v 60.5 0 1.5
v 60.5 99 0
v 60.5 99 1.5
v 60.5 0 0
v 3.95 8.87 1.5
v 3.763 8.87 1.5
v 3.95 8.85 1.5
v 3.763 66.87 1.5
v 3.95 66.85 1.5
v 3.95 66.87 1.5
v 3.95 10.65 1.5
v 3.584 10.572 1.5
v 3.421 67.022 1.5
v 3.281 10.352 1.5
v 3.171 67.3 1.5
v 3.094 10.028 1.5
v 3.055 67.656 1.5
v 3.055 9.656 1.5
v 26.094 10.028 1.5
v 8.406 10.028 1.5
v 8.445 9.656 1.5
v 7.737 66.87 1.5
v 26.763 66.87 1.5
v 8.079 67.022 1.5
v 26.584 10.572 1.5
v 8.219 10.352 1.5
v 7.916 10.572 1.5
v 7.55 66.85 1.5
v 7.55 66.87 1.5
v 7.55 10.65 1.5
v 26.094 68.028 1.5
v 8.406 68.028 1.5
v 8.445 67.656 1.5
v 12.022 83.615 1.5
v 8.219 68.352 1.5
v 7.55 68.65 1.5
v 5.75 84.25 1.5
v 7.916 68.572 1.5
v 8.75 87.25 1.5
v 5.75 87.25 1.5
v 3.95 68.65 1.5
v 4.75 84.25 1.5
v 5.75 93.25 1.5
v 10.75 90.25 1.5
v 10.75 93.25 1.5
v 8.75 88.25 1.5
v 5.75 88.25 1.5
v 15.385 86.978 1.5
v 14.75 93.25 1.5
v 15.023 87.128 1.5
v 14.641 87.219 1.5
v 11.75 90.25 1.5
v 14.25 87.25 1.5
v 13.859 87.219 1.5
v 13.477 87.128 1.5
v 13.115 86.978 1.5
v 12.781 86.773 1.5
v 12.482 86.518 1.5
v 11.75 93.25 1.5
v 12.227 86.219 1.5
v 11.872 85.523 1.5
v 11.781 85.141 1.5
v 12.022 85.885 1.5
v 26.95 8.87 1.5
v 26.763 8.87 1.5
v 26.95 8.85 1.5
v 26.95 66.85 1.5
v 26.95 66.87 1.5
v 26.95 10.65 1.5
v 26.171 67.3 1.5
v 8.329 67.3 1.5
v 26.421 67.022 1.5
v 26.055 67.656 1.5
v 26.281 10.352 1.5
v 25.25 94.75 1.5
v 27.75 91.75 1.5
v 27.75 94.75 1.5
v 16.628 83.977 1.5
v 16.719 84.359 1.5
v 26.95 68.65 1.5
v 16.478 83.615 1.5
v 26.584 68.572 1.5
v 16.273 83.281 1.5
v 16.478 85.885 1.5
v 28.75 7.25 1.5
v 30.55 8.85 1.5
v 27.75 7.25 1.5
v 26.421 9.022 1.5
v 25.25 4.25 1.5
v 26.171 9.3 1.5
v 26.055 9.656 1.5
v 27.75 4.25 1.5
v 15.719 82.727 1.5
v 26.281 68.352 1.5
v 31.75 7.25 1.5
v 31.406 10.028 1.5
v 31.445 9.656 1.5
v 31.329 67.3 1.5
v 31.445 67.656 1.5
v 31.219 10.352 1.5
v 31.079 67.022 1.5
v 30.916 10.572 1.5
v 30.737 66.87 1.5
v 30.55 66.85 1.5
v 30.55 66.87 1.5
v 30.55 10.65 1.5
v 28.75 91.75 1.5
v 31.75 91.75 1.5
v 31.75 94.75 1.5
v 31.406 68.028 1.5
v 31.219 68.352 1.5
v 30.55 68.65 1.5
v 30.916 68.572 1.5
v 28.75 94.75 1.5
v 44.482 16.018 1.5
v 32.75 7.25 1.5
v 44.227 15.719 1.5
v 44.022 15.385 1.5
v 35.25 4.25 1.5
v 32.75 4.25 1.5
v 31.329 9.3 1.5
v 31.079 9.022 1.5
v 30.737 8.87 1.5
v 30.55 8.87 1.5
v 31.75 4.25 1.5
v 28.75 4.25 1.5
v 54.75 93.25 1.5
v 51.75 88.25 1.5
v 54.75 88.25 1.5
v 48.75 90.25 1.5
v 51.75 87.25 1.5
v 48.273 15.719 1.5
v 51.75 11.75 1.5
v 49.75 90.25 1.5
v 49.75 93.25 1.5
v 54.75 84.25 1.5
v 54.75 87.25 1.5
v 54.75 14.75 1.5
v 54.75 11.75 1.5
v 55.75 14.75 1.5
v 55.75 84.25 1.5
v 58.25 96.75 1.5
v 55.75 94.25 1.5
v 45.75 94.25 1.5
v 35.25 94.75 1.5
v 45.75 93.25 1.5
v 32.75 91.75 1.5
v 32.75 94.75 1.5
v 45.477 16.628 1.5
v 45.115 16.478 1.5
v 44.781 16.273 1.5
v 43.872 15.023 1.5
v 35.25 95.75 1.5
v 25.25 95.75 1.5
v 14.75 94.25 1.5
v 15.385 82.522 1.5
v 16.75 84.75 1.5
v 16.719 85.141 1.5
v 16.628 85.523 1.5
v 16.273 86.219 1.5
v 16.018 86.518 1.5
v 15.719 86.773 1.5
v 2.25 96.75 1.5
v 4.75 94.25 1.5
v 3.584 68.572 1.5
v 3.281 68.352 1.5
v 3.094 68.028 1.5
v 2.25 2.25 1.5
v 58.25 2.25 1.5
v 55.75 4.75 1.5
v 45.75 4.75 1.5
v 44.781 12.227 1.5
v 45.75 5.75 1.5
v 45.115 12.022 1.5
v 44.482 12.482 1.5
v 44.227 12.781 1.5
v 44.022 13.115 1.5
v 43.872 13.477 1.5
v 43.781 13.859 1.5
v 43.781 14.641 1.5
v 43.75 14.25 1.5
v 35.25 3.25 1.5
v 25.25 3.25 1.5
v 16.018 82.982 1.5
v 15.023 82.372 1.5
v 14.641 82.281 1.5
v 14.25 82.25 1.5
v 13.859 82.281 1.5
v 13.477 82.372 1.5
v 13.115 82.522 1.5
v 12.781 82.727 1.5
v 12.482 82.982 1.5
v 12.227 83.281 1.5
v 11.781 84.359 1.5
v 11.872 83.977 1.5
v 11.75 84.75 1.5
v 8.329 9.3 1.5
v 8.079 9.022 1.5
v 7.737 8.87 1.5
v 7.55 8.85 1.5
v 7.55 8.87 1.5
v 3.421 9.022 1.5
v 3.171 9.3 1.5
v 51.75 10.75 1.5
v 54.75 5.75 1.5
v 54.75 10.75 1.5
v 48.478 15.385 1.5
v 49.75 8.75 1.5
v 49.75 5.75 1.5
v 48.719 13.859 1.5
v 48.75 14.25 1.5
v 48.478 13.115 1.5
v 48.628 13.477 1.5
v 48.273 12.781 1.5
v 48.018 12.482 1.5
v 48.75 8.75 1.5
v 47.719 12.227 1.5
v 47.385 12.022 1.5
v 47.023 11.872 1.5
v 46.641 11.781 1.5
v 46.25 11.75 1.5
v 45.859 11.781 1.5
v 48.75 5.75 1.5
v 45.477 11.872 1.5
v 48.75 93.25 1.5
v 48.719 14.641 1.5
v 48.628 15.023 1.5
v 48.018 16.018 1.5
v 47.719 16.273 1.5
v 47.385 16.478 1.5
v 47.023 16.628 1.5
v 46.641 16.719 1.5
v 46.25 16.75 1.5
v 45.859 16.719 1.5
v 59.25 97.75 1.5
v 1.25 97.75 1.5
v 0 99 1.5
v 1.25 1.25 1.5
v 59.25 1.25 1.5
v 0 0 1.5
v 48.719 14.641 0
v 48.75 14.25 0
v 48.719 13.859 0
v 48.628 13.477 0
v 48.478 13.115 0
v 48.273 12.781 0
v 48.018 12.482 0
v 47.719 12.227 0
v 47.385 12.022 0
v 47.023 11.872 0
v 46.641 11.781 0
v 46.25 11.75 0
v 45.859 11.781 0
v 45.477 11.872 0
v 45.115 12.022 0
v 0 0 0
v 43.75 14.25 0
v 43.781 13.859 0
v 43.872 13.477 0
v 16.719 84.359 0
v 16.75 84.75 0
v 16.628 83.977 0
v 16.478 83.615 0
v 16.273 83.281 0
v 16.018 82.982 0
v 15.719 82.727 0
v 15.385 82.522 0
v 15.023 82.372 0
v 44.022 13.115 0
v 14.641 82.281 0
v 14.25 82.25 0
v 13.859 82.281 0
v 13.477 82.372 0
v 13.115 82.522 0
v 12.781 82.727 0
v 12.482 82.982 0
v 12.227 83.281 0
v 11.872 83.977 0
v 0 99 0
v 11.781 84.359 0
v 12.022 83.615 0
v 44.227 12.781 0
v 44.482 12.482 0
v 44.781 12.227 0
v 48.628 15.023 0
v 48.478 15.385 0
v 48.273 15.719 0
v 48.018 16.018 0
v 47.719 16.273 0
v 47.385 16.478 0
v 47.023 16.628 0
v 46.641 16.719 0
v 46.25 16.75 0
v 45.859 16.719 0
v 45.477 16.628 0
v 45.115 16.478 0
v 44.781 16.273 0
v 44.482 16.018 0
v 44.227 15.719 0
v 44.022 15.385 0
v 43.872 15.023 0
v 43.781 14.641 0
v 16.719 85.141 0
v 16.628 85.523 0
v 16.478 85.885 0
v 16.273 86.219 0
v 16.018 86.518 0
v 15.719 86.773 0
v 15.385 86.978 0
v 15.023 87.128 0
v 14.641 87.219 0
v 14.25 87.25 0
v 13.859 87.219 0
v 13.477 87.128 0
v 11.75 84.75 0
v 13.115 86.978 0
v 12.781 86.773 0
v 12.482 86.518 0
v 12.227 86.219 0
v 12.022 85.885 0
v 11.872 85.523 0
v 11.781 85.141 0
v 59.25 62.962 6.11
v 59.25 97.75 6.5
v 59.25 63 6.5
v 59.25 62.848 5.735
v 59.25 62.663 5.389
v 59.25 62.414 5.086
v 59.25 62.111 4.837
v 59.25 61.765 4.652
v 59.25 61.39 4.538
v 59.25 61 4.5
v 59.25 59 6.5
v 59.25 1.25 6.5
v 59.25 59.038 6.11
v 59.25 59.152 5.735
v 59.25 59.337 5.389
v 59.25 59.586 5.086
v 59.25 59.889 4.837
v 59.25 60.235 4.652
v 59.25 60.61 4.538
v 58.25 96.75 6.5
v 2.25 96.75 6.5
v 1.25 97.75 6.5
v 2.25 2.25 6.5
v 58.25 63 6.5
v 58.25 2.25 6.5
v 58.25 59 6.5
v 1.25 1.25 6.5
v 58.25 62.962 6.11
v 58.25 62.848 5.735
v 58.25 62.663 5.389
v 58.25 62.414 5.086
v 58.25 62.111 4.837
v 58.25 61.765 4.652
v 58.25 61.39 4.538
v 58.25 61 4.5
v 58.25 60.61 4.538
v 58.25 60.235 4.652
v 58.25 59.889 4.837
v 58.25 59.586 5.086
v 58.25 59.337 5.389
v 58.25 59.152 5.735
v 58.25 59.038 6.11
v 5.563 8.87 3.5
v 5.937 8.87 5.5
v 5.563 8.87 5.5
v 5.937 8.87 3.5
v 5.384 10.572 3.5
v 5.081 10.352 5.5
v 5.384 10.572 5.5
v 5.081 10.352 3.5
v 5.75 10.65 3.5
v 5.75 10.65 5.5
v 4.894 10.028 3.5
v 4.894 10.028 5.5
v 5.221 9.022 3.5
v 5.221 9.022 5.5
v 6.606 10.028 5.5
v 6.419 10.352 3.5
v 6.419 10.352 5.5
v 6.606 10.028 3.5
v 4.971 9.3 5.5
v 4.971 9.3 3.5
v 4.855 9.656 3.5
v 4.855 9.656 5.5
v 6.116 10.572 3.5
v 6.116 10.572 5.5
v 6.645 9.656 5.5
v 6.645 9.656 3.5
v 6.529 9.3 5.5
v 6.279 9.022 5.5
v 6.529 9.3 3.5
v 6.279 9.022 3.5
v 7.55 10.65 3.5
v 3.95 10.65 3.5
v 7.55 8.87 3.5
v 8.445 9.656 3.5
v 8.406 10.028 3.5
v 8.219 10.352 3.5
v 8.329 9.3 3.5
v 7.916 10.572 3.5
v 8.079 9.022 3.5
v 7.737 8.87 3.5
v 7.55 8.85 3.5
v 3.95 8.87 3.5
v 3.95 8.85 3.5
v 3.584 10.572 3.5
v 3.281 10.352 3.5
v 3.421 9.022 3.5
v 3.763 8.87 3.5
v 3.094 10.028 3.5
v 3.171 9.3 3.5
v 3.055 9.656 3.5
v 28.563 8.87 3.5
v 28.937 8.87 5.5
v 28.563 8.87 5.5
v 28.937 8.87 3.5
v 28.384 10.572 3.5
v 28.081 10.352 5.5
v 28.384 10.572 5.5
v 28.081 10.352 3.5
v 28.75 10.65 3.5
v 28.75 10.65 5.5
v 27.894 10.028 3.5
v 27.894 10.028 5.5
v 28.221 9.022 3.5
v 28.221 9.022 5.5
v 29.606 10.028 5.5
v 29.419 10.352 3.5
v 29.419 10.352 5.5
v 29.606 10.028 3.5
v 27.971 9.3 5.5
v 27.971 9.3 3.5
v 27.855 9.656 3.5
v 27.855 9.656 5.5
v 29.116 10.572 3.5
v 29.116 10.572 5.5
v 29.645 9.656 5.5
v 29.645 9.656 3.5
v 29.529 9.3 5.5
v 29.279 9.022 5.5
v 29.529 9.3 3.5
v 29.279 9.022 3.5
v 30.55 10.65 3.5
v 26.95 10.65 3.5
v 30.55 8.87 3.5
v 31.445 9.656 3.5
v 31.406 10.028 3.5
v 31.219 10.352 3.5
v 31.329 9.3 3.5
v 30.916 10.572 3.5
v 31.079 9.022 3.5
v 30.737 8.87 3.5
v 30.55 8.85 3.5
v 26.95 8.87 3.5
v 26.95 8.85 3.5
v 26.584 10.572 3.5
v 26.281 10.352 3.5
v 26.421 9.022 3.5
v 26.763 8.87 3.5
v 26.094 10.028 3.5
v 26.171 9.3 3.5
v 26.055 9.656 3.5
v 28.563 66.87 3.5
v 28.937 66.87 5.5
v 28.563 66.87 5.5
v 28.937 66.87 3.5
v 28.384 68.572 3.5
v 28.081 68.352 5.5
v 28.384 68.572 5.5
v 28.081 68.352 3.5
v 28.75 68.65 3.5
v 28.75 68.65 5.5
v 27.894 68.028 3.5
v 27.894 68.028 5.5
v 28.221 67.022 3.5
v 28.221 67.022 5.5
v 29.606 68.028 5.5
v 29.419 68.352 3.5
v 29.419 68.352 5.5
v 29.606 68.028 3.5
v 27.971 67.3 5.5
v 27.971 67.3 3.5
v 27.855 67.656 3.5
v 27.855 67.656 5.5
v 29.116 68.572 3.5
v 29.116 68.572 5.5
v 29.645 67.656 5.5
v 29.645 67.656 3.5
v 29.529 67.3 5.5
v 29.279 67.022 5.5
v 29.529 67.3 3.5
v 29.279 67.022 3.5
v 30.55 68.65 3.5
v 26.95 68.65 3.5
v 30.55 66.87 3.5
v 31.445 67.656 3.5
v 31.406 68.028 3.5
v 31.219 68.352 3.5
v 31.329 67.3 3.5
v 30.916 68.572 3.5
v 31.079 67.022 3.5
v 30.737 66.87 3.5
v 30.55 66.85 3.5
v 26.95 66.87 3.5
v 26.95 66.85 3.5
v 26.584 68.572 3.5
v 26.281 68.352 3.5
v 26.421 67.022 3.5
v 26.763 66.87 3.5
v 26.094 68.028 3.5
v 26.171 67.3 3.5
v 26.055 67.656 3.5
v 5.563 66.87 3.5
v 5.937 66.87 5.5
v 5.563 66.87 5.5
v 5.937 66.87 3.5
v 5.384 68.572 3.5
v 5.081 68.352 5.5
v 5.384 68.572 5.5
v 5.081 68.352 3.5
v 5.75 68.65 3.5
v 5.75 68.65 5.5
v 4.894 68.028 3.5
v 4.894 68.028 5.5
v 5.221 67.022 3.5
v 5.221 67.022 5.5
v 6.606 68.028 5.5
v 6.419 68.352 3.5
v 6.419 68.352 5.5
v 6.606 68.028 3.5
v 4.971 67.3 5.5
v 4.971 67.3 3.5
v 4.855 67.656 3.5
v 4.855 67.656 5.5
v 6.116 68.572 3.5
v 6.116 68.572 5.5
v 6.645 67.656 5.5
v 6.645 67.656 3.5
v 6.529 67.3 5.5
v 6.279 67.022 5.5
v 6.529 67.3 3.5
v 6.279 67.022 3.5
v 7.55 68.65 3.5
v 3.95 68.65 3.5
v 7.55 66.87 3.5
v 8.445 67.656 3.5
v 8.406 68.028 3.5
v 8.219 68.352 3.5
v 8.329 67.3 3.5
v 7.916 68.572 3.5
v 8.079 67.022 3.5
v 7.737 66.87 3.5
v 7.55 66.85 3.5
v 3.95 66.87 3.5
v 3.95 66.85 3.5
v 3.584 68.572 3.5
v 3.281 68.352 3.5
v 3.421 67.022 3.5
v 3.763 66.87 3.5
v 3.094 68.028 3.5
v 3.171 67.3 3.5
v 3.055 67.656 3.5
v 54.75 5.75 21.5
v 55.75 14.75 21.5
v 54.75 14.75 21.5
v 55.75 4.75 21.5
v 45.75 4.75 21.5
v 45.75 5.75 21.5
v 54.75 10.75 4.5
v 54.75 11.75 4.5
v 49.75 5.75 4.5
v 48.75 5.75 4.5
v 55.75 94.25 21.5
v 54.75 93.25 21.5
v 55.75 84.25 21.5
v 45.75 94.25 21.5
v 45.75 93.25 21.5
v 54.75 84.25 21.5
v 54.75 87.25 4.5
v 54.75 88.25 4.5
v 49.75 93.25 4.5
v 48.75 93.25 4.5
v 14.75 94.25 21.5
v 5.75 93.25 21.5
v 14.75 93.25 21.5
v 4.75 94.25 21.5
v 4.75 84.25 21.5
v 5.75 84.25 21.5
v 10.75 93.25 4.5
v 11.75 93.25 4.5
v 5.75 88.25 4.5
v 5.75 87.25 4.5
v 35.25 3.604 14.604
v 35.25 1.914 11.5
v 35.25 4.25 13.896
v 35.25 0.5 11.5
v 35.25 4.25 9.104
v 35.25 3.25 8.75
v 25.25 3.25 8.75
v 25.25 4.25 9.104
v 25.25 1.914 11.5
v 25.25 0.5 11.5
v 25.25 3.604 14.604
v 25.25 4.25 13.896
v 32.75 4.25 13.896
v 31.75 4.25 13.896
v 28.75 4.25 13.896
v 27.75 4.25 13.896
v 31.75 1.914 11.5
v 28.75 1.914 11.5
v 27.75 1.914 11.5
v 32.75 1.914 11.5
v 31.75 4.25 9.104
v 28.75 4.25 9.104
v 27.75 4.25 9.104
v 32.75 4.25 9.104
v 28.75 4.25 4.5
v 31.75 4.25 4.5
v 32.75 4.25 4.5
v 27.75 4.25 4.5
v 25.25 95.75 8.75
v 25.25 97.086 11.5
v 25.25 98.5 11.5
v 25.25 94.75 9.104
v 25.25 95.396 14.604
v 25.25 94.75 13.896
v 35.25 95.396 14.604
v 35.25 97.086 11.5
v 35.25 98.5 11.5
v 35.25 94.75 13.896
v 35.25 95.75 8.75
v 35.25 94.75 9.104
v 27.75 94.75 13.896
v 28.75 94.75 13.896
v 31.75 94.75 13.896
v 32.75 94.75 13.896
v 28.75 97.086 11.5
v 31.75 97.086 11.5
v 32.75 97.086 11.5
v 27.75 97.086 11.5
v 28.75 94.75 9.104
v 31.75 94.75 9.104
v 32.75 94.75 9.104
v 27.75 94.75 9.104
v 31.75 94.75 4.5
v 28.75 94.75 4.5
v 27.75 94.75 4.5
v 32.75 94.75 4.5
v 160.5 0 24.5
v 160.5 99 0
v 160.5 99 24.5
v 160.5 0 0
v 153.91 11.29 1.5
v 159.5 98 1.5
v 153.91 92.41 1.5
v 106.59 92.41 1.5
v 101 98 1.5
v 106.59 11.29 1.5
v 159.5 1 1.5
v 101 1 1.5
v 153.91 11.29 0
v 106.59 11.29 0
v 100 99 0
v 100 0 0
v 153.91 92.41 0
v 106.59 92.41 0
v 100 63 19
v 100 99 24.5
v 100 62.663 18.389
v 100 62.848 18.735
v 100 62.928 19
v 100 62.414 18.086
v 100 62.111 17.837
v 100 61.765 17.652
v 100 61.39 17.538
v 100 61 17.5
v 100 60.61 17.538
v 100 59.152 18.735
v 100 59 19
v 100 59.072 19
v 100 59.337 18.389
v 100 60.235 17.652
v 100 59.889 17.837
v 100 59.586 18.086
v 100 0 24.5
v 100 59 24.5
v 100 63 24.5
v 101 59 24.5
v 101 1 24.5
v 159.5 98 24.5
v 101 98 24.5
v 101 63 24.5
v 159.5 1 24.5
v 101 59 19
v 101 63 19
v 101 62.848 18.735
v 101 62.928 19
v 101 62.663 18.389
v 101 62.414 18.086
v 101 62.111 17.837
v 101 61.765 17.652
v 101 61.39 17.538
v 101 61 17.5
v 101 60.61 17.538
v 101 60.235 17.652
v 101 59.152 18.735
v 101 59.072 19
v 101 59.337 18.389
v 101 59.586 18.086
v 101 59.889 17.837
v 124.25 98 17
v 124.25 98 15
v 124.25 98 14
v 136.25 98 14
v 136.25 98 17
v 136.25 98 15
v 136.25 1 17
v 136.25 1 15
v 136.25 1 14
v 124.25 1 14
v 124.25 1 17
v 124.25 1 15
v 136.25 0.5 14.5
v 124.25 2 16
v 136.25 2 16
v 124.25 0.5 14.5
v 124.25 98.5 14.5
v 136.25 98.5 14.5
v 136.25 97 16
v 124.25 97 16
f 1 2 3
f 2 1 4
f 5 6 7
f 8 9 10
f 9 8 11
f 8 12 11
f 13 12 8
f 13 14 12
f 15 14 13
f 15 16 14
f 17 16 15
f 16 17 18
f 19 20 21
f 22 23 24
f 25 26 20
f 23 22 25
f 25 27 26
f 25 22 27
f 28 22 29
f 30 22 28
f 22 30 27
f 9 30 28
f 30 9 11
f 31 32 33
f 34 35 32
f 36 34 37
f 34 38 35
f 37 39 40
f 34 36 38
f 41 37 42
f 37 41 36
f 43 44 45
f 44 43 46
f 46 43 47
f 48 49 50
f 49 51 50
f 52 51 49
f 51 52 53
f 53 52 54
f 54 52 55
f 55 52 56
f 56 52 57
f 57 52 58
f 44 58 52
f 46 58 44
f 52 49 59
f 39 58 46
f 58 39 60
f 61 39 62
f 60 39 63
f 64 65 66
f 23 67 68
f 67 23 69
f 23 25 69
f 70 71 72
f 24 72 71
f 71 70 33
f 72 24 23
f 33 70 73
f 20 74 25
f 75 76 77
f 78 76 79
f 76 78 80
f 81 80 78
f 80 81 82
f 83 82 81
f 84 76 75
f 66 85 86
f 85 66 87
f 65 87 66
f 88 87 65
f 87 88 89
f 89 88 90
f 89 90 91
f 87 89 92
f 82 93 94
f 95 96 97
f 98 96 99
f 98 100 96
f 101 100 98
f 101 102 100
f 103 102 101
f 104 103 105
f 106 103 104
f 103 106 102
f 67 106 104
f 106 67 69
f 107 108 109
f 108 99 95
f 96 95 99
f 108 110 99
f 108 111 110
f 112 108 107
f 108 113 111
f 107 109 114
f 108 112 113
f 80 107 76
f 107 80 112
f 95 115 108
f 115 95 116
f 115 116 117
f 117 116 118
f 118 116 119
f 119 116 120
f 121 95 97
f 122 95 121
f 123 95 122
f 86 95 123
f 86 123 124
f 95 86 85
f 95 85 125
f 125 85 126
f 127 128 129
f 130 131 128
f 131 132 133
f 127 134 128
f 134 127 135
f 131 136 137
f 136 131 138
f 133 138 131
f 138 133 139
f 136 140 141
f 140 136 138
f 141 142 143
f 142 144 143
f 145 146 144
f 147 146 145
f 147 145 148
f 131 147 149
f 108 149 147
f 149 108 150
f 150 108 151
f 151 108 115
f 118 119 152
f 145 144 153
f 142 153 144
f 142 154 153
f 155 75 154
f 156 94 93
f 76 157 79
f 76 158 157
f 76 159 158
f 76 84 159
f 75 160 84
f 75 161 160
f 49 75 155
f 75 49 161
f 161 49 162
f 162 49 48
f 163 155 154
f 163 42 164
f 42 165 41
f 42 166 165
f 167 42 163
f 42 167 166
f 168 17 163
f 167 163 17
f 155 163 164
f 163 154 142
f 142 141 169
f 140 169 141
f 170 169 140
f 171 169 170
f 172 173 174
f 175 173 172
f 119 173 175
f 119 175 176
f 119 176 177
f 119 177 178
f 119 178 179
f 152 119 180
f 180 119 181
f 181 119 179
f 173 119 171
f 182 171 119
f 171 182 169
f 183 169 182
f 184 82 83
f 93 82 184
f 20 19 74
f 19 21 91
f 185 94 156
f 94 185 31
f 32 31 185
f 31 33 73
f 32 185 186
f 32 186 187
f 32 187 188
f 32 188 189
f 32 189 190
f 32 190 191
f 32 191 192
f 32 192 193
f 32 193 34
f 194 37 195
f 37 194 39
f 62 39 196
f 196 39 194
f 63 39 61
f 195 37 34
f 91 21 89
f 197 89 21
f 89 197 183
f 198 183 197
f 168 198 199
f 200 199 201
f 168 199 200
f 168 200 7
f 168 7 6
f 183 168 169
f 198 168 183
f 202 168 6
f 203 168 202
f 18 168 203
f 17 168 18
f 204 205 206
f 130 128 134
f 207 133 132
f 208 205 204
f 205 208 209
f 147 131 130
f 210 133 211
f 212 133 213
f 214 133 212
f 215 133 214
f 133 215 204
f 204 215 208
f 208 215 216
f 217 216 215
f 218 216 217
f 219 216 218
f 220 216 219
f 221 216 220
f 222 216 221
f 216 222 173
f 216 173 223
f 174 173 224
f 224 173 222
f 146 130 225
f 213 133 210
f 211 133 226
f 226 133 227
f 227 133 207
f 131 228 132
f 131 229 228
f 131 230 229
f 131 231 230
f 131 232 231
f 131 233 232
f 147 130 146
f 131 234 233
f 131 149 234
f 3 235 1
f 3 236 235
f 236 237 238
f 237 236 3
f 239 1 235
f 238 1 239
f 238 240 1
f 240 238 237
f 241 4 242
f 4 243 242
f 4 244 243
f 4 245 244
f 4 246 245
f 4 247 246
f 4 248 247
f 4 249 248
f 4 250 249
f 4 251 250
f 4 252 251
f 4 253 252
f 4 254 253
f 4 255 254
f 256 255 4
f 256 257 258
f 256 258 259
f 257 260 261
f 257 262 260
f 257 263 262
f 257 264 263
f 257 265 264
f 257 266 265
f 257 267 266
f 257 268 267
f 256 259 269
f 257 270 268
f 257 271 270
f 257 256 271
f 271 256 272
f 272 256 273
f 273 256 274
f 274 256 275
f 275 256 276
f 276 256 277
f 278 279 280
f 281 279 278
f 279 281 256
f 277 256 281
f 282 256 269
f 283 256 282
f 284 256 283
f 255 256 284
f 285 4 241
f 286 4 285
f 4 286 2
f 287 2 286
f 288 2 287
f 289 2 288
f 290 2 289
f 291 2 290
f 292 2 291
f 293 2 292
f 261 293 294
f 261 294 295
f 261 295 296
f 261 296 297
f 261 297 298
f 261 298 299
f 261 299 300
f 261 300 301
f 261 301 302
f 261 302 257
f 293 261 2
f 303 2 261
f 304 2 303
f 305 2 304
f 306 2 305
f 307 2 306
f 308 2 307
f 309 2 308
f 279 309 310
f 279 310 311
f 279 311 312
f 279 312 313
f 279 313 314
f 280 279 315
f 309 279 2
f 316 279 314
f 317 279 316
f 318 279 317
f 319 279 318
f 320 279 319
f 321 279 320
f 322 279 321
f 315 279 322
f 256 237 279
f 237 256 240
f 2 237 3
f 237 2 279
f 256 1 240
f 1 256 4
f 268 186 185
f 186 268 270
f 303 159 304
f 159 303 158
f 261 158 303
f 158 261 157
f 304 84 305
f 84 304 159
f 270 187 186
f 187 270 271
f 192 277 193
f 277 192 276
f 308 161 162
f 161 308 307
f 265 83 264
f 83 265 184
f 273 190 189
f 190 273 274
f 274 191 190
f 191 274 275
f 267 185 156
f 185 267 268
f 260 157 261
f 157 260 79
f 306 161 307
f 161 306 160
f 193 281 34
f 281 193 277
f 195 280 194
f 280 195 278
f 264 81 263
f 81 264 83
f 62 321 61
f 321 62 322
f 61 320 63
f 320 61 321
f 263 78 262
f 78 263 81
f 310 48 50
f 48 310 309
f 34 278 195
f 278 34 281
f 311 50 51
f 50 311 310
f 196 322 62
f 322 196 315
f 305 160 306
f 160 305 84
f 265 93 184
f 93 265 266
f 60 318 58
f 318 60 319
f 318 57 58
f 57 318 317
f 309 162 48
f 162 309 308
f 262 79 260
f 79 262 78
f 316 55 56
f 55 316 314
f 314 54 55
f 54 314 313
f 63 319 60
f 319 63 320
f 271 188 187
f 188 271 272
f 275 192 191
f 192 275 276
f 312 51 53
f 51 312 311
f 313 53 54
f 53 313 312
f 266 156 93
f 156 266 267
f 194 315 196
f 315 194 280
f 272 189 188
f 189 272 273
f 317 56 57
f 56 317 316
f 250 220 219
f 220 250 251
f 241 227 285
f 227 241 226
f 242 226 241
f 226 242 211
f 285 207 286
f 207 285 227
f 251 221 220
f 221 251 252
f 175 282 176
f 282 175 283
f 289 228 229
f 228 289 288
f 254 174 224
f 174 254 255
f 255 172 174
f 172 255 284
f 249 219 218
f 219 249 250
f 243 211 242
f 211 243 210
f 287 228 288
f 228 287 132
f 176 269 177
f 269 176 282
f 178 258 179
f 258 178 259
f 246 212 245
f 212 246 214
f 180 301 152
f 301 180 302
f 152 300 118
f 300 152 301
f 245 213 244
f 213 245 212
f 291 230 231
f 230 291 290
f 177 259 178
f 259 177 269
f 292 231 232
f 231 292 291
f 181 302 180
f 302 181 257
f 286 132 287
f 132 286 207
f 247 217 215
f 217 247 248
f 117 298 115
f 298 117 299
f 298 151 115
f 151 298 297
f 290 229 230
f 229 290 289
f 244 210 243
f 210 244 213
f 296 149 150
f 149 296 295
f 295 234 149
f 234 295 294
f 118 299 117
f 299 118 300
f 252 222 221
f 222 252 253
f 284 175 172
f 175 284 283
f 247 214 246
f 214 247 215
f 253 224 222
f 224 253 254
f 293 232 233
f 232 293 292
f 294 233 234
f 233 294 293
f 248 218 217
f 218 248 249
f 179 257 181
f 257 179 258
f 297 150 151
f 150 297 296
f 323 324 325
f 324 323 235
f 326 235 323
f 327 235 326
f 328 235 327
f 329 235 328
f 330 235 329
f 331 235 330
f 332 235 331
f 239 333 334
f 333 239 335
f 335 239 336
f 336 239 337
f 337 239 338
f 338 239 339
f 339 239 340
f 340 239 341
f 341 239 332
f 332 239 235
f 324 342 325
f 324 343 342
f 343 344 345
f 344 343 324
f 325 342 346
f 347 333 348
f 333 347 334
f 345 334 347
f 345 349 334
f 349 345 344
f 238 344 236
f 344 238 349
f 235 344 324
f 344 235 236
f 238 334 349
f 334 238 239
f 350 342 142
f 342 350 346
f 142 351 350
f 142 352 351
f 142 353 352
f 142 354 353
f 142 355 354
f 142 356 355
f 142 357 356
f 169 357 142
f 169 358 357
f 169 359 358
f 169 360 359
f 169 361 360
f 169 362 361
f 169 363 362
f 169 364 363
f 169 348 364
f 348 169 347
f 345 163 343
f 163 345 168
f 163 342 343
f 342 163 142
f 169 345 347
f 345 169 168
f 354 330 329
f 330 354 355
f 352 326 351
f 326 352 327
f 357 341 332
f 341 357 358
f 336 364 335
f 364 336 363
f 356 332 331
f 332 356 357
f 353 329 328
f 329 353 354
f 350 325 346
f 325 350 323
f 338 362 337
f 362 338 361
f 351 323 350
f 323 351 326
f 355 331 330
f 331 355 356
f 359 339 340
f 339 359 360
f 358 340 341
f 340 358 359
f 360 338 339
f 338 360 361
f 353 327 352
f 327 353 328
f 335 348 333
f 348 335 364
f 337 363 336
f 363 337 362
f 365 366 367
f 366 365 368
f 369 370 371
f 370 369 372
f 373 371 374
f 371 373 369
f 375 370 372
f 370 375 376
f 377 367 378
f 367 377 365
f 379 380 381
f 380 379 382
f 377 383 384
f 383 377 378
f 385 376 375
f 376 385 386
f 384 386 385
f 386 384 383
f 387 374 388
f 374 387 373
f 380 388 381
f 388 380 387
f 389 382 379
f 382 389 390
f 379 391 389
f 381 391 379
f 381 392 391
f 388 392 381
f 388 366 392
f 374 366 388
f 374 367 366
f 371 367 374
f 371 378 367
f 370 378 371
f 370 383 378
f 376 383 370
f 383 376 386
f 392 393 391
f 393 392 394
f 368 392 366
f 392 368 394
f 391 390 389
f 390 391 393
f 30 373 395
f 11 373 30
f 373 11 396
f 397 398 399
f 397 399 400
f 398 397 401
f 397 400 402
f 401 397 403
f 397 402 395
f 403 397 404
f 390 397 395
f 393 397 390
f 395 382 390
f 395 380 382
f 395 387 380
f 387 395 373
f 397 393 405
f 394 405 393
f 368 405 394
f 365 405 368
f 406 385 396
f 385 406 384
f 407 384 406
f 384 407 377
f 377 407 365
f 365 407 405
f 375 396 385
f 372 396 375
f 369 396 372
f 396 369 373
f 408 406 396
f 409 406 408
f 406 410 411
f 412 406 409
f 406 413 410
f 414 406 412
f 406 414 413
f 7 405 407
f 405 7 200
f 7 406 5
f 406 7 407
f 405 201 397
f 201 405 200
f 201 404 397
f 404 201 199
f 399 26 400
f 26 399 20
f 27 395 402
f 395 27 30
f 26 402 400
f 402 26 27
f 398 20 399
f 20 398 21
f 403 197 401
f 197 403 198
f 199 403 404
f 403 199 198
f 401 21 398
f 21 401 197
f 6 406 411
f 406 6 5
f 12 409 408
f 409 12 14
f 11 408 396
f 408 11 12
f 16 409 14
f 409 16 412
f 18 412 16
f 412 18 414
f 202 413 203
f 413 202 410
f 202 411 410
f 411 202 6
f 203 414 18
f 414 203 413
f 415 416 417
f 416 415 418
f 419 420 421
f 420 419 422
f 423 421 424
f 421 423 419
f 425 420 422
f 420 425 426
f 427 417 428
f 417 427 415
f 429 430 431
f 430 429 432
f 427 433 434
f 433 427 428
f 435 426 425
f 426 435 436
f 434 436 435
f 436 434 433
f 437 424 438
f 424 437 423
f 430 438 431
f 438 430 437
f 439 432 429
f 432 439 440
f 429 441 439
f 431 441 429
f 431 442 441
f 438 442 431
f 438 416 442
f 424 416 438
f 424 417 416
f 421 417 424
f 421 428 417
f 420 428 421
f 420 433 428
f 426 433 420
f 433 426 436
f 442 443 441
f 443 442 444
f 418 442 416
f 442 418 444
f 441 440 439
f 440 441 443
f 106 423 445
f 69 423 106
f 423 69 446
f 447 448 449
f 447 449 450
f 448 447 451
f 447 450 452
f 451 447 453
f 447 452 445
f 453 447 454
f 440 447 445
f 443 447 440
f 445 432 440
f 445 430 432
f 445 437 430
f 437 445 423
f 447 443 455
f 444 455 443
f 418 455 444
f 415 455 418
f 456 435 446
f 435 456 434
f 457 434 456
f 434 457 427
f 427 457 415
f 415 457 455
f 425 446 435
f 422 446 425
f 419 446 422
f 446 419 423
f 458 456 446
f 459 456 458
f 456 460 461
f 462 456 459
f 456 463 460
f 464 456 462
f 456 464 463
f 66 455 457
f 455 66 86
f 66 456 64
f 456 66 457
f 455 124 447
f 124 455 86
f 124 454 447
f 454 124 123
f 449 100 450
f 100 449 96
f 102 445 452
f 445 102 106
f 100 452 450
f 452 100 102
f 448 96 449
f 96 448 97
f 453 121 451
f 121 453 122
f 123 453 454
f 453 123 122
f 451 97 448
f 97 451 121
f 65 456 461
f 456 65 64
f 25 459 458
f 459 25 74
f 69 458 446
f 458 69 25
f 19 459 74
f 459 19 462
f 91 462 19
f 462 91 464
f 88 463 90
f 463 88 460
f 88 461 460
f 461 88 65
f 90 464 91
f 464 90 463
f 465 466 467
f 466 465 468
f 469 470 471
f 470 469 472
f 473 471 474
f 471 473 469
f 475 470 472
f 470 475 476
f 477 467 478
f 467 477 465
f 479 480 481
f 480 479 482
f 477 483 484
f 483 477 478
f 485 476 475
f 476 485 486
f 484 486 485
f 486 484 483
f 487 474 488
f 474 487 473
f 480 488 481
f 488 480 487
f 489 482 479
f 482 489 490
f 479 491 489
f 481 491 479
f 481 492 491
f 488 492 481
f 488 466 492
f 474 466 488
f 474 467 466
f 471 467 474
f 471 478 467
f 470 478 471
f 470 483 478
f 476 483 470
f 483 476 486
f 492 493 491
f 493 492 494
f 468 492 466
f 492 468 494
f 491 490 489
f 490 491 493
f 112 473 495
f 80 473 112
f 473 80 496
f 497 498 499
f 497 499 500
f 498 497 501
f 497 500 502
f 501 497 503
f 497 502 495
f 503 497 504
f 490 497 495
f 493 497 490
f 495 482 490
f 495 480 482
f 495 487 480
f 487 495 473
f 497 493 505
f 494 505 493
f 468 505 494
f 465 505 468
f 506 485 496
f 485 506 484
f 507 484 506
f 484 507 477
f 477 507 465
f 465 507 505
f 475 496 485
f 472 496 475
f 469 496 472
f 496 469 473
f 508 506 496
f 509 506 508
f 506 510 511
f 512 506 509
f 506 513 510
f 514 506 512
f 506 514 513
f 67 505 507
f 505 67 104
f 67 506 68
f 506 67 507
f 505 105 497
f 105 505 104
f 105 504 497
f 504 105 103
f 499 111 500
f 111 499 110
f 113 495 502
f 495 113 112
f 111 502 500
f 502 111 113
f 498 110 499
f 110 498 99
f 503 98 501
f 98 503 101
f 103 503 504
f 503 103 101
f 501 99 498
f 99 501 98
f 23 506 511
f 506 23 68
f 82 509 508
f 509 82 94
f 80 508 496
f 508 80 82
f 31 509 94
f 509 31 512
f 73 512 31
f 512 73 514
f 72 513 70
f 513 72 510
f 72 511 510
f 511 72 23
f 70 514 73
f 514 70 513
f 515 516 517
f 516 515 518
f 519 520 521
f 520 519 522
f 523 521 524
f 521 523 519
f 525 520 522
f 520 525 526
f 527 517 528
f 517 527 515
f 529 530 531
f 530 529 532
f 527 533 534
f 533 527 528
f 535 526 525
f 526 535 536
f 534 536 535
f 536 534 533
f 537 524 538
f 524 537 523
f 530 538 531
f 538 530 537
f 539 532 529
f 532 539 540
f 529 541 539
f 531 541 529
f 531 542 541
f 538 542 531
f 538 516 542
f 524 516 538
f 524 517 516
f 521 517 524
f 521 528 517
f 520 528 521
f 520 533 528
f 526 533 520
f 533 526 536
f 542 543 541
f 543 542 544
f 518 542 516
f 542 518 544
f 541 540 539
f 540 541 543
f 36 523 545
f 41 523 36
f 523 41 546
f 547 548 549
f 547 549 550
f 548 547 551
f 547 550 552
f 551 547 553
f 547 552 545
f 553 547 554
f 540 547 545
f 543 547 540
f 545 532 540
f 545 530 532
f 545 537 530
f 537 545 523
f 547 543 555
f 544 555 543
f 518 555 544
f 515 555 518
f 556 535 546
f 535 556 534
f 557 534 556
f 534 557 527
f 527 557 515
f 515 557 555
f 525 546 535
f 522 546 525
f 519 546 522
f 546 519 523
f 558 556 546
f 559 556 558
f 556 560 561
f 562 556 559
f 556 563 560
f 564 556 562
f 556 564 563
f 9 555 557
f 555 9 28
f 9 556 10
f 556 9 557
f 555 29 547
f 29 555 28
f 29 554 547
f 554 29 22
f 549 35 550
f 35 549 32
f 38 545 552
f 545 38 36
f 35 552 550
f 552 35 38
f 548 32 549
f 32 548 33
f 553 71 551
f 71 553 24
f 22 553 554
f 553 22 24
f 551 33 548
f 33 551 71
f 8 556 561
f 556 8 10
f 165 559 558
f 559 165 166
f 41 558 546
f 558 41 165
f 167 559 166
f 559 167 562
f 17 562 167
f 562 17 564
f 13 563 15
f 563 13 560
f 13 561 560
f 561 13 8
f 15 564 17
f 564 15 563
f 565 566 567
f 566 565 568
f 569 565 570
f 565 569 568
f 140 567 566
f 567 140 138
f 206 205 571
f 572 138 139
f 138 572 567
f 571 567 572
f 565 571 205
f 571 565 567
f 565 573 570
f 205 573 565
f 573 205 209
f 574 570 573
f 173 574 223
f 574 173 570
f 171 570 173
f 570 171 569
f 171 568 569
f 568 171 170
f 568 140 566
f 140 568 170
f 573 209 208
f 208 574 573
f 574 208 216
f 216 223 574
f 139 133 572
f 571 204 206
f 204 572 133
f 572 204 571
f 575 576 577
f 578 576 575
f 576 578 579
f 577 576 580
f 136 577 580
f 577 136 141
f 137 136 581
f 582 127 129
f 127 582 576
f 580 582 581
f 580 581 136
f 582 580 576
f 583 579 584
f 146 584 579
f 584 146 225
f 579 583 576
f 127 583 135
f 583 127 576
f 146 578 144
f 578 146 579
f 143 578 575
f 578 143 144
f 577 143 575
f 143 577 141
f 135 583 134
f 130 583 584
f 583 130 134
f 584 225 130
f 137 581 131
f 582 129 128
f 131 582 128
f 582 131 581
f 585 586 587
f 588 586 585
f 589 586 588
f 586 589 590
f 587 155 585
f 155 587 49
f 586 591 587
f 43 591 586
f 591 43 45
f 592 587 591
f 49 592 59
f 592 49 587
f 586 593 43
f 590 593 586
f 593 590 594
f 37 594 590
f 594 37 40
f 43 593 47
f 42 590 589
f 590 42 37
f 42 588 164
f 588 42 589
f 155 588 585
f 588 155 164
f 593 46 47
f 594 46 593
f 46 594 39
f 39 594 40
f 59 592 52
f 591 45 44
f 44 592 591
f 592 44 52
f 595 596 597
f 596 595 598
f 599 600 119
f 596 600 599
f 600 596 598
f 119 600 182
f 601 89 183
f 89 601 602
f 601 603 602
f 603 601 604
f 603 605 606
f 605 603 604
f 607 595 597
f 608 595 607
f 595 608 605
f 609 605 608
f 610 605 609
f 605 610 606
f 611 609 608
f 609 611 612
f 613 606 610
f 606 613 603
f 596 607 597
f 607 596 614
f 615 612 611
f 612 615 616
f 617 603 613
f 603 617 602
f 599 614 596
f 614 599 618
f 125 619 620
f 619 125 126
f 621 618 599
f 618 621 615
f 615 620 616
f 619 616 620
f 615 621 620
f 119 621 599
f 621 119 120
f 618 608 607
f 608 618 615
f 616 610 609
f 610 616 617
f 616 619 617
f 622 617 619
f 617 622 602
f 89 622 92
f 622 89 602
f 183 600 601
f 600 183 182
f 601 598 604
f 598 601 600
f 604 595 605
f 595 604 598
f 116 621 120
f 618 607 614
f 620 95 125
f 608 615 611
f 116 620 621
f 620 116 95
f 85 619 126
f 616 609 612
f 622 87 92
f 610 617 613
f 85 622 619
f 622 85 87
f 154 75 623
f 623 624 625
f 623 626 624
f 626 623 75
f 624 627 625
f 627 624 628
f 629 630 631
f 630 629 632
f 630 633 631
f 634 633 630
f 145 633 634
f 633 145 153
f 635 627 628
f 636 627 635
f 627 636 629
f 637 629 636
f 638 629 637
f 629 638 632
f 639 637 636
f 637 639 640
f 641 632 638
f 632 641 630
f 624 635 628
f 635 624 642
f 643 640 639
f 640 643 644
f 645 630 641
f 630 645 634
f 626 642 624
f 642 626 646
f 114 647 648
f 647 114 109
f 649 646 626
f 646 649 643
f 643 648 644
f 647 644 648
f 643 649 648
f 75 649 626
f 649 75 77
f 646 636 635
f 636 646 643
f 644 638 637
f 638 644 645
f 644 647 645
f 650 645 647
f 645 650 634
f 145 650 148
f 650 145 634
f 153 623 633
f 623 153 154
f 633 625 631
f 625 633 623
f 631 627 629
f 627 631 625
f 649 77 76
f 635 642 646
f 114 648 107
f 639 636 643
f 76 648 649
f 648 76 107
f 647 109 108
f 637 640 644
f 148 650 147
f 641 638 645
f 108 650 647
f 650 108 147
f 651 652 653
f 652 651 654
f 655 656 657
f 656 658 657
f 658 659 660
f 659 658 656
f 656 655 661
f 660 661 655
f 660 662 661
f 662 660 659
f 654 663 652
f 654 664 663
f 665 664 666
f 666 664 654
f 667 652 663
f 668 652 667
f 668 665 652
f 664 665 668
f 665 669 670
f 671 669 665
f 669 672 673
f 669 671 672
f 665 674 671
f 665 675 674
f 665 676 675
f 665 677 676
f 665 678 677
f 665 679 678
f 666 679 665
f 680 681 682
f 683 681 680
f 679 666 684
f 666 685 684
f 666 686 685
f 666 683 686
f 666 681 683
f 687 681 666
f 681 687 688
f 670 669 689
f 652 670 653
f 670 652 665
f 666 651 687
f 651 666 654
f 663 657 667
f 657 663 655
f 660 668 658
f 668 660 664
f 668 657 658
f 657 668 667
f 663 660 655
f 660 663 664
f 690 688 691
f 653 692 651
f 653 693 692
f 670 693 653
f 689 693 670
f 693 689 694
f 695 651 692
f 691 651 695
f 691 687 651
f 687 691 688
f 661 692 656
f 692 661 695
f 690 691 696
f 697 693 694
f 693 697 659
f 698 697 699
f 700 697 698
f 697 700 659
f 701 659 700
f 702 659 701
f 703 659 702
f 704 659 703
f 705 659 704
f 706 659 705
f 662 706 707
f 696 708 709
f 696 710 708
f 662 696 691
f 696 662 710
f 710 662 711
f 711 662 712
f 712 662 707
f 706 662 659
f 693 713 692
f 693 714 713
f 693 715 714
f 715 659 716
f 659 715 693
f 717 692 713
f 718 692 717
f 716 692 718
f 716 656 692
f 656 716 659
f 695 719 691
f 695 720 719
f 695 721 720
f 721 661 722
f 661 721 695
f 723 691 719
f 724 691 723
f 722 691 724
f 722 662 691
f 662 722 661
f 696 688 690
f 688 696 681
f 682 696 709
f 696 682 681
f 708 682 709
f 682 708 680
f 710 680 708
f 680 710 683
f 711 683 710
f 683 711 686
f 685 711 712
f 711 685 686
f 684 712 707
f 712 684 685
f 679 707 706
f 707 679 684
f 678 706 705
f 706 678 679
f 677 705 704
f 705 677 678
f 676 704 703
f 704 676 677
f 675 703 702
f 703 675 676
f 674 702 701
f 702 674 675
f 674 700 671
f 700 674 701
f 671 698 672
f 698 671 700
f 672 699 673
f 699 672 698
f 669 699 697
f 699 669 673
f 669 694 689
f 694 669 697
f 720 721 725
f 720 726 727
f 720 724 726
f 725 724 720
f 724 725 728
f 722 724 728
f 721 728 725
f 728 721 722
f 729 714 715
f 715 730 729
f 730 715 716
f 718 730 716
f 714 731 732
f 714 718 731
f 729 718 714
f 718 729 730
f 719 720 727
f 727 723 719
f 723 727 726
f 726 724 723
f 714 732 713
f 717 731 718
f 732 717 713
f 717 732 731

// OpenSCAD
// file: variables.scad
$fa = 1;
$fs = 0.4;

wall_thickness = 1;
wall_buffer = 0.25;
back_thickness = 1.5;

hat_width = 58;
hat_length = 96.5;
hat_thickness = 3;
hat_height = 21;
hat_bottom_padding = 2;

display_width = 47.32;
display_length = 81.12;
display_inset = (hat_width - display_width) / 2;

case_width = hat_width + (wall_thickness + wall_buffer) * 2;
case_length = hat_length + (wall_thickness + wall_buffer) * 2;
case_height = hat_height + hat_bottom_padding + back_thickness * 2;

cable_cutout_radius = 2;
cable_cutout_offset = 61;
cable_cutout_height = 6.5;

clip_width = 10;
clip_point_height = 10;

$vpt = [hat_width / 2, hat_length / 2, 0];
$vpd = 500;
// file: front.scad
include<./variables.scad>

top_inside_width = case_width - wall_thickness * 2;
top_inside_length = case_length - wall_thickness * 2;

clip_point_height_rev = case_height - back_thickness - clip_point_height;

cable_cutout_height_rev = case_height - cable_cutout_height;

color("gray")

union() {
    difference() {
        base();
        
        // Clips inset
        translate([case_width / 2, 0, 0])
        rotate([0, -90, 0])
        linear_extrude(
            height = clip_width + 2,
            center = true
        )
        polygon([
            [clip_point_height_rev + wall_thickness, wall_thickness * 1.5],
            [clip_point_height_rev, wall_thickness / 2],
            [clip_point_height_rev - wall_thickness, wall_thickness * 1.5],
        ]);
        
        translate([case_width / 2, case_length, 0])
        rotate([180, -90, 0])
        linear_extrude(
            height = clip_width + 2,
            center = true
        )
        polygon([
            [clip_point_height_rev + wall_thickness, wall_thickness * 1.5],
            [clip_point_height_rev, wall_thickness / 2],
            [clip_point_height_rev - wall_thickness, wall_thickness * 1.5],
        ]);
    }
    
    // Clips
    translate([case_width / 2, 0, 0])
    rotate([0, -90, 0])
    linear_extrude(
        height = clip_width + 2,
        center = true
    )
    polygon([
        [clip_point_height_rev, wall_thickness / 2],
        [clip_point_height_rev + wall_thickness * 1.5, wall_thickness * 2],
        [clip_point_height_rev + wall_thickness * 3, wall_thickness / 2],
    ]);
    
    translate([case_width / 2, case_length, 0])
    rotate([180, -90, 0])
    linear_extrude(
        height = clip_width + 2,
        center = true
    )
    polygon([
        [clip_point_height_rev, wall_thickness / 2],
        [clip_point_height_rev + wall_thickness * 1.5, wall_thickness * 2],
        [clip_point_height_rev + wall_thickness * 3, wall_thickness / 2],
    ]);
}

module base() {
    // Bottom face
    difference() {
        cube([
            case_width,
            case_length,
            back_thickness
        ]);
        
        translate([
            display_inset + wall_thickness + wall_buffer,
            case_length - (display_inset + wall_thickness + wall_buffer + display_length),
            -1
        ])
        cube([
            display_width,
            display_length,
            back_thickness + 2
        ]);
    }
    
    // Sides
    difference() {
        cube([
            case_width,
            case_length,
            case_height - back_thickness
        ]);
        
        translate([
            wall_thickness,
            wall_thickness,
            -1
        ])
        cube([
            top_inside_width,
            top_inside_length,
            case_height - back_thickness + 2
        ]);
        
        // Cable cutout
        translate([
            -1,
            cable_cutout_offset,
            0
        ])
        rotate([0, 90, 0])
        linear_extrude(
            height = wall_thickness + 2
        )
        union() {
            translate([
                -cable_cutout_height_rev,
                0
            ])
            circle(
                r = cable_cutout_radius
            );
            
            translate([
                -(case_height - back_thickness + 1),
                -cable_cutout_radius
            ])
            square([
                cable_cutout_height,
                cable_cutout_radius * 2
            ]);
        }
    }
}
// main file
include<./back.scad>

translate([100, 0, 0])
front();

$vpt = [(100 + hat_width) / 2, hat_length / 2, 0];

module front() {
    include<./front.scad>
}
